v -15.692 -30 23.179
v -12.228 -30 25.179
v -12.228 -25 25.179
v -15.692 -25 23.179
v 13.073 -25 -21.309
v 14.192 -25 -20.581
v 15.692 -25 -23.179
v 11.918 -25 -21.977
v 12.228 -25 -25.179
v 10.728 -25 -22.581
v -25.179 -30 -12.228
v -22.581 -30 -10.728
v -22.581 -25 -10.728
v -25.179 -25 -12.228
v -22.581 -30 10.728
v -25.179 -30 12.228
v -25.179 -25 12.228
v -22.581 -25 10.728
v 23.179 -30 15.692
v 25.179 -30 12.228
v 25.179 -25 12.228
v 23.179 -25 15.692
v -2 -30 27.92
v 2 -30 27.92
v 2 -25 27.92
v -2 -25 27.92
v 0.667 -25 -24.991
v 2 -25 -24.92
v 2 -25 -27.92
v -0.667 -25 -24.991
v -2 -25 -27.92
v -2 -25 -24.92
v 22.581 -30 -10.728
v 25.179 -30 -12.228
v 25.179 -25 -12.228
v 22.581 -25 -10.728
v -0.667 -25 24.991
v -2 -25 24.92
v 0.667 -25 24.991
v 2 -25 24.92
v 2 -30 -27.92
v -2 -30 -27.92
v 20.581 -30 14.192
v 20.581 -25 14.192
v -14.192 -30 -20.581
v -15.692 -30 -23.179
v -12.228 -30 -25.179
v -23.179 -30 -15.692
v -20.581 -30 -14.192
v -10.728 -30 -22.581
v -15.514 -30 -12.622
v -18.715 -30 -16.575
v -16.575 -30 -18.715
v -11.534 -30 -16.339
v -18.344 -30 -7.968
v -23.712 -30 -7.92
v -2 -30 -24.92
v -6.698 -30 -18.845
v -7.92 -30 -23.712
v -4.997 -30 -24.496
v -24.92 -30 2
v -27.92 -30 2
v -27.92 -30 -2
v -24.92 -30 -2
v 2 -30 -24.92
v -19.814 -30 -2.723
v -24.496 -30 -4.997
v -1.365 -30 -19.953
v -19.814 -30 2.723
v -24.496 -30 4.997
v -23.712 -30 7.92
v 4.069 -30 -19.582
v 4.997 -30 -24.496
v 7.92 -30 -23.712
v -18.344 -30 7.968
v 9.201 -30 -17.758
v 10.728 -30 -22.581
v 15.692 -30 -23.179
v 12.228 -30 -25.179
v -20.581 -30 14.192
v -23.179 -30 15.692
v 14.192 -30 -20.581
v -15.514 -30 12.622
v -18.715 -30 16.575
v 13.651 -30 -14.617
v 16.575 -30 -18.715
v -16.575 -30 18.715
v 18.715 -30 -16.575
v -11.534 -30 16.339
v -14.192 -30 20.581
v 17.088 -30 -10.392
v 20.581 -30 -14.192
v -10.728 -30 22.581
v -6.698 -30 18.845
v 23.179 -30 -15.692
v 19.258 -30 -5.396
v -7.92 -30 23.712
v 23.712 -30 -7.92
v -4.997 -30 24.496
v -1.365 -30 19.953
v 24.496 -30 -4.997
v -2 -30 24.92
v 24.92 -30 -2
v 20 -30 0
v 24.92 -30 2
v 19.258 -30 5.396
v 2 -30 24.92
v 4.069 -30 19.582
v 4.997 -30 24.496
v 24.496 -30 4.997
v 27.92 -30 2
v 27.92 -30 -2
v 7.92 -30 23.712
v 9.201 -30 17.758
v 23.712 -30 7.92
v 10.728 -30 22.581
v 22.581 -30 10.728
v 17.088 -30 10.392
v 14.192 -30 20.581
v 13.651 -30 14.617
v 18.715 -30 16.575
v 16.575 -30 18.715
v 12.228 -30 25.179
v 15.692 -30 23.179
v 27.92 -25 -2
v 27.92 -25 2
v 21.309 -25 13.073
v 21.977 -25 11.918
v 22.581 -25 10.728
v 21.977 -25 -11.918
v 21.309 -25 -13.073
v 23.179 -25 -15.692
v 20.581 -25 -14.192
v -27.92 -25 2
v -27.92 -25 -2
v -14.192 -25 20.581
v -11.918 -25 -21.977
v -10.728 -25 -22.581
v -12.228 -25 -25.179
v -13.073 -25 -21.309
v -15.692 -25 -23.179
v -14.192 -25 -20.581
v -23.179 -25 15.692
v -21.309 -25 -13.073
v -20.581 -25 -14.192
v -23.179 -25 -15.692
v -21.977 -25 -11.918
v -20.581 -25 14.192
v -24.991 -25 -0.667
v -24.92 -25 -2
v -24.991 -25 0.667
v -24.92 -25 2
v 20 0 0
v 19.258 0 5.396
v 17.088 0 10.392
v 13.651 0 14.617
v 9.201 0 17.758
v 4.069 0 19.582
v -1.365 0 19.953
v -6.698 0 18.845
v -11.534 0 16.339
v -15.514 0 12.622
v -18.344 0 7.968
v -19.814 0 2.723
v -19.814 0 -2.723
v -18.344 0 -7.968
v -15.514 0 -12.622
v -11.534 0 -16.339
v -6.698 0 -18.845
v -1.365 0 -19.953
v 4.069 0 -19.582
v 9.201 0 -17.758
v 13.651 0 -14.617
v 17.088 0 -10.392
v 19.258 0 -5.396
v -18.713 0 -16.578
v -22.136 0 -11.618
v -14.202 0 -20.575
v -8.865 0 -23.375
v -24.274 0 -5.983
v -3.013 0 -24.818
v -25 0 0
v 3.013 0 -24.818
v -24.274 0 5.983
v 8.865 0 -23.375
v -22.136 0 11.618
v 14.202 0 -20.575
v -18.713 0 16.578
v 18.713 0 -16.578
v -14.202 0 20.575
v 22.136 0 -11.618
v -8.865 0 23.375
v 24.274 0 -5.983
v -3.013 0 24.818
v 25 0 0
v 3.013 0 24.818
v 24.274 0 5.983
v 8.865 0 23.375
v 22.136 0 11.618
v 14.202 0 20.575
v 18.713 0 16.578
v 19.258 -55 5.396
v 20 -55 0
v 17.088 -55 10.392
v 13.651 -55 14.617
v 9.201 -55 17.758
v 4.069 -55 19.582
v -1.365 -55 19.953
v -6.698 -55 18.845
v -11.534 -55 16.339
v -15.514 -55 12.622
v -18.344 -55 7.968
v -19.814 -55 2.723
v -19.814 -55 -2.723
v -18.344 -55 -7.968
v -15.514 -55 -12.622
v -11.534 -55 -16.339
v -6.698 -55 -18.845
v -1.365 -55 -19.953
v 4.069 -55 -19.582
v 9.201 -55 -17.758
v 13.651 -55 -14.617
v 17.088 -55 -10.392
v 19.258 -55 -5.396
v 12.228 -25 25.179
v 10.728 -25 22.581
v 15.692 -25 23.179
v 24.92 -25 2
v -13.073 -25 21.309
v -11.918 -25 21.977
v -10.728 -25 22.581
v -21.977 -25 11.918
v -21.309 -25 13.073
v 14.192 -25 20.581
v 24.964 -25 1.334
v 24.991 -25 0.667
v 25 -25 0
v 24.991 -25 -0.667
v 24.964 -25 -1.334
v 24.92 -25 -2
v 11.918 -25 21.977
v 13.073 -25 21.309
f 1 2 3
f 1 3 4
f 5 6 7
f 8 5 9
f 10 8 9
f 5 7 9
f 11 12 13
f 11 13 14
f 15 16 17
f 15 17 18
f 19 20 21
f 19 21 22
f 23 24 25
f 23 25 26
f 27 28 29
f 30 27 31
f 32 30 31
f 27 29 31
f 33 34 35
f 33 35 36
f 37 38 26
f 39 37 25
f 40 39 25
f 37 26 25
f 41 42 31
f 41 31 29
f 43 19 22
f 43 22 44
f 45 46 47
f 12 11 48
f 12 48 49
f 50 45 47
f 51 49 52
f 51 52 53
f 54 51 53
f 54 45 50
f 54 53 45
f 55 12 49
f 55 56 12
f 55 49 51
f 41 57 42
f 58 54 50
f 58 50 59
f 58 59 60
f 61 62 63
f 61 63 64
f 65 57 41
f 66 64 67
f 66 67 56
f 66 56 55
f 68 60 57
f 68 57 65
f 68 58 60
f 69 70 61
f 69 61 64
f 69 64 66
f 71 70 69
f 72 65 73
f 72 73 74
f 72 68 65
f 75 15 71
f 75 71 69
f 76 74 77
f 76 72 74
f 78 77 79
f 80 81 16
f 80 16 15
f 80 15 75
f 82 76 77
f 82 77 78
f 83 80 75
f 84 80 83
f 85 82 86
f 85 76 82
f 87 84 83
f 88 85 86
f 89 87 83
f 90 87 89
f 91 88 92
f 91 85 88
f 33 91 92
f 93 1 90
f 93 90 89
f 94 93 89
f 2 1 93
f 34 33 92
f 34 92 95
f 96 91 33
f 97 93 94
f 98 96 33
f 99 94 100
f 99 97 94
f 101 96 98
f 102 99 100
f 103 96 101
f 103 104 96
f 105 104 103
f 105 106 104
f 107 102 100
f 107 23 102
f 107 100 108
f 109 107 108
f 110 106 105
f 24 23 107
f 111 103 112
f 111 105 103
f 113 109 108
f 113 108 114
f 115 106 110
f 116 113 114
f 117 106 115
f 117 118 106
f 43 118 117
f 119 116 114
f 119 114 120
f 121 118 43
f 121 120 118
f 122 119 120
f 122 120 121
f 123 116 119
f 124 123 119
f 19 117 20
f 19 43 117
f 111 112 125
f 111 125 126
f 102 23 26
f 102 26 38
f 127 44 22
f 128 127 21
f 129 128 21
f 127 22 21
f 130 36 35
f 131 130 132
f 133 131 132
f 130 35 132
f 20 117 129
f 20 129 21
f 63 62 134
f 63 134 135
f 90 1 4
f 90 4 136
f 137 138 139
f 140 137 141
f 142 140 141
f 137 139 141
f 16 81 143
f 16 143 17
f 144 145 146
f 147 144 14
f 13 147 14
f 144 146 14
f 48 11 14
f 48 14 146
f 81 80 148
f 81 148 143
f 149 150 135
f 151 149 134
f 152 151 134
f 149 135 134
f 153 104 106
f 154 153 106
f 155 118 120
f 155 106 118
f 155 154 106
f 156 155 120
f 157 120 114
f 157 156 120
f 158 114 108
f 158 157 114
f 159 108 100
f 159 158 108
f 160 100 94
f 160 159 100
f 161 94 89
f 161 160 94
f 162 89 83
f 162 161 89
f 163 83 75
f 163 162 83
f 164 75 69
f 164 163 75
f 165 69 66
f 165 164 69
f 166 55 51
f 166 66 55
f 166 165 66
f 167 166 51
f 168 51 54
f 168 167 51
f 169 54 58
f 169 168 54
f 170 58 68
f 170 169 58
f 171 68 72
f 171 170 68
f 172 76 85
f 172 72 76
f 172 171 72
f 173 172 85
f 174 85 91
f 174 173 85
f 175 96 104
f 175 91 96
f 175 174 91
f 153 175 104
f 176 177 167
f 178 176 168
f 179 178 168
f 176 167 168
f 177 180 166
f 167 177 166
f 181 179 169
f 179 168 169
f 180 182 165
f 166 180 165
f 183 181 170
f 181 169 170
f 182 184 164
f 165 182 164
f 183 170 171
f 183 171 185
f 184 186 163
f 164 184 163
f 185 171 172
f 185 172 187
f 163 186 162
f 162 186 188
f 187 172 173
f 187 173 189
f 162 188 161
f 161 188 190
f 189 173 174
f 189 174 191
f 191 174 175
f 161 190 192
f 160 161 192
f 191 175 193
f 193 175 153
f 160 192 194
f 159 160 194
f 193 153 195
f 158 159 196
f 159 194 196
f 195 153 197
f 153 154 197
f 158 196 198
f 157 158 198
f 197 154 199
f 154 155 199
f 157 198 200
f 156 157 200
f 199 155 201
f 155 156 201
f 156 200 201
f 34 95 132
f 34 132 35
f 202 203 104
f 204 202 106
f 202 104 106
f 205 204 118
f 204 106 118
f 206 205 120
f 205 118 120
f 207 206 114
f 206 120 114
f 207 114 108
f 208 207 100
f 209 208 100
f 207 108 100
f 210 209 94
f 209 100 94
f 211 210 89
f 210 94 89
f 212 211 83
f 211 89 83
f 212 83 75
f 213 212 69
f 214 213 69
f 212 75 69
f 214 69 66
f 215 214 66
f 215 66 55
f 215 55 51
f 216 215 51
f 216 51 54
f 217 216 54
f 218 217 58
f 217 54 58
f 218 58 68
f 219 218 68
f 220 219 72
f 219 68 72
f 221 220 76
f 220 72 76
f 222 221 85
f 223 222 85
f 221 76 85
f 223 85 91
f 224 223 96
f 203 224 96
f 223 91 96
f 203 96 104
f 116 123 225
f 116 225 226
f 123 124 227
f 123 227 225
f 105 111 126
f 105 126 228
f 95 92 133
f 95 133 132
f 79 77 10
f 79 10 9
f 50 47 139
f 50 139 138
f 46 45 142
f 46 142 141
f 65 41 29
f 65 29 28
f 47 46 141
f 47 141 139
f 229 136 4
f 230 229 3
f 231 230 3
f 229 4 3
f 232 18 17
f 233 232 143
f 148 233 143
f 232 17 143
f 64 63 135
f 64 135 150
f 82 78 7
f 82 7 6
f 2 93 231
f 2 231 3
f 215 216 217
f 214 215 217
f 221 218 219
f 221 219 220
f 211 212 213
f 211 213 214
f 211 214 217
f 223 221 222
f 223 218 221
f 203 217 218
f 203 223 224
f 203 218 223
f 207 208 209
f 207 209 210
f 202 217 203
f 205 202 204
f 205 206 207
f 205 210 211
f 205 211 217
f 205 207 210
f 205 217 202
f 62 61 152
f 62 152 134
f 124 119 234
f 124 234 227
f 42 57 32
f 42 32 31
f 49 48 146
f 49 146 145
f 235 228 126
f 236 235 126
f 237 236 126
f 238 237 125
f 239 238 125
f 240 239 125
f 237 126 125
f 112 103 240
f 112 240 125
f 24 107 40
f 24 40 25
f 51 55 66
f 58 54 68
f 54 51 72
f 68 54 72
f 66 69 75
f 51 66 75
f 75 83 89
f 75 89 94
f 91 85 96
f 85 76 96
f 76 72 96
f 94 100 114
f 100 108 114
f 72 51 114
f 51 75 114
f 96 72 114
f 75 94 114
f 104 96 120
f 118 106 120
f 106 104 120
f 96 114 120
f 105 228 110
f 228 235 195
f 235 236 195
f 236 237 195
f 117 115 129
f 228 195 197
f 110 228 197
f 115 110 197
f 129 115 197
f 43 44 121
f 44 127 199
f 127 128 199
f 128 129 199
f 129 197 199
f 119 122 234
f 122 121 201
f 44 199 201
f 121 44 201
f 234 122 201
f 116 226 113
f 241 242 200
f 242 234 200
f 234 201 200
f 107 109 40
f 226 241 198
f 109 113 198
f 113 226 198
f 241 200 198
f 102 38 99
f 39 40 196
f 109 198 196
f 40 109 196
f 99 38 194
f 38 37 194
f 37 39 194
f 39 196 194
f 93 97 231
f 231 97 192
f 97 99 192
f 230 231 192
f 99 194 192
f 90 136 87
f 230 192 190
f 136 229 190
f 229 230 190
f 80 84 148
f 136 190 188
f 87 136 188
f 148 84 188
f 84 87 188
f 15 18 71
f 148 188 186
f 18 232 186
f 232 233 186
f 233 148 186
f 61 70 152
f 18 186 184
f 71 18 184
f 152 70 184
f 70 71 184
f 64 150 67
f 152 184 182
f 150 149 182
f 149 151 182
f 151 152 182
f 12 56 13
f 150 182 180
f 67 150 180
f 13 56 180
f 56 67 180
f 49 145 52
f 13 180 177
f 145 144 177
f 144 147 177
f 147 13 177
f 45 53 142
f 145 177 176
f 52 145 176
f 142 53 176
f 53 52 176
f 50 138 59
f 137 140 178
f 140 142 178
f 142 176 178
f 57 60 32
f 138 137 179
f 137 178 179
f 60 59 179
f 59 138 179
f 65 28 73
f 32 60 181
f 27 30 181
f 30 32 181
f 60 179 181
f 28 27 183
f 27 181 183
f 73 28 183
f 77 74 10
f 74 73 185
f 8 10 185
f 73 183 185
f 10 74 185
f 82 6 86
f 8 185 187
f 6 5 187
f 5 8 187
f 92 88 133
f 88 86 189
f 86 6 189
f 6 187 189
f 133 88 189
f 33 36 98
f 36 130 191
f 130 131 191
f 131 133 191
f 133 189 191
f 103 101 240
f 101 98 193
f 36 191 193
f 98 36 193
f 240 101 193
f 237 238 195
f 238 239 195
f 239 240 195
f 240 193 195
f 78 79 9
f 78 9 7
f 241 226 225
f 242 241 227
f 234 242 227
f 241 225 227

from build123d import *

# Parameters (mm, degrees)
F0_R     = 25
F0_R_2   = 20
F1_DEPTH = 30
F3_DEPTH = 5
F4_COUNT = 12
F5_R     = 20
F6_DEPTH = 25


with BuildPart() as f1:
    # F0 (on Front) → F1 (new body)
    with BuildSketch(Plane.XZ):
        Circle(F0_R)
        Circle(F0_R_2, mode=Mode.SUBTRACT)
    extrude(amount=F1_DEPTH)

    # F2 (on face) → F3 (join)
    with BuildSketch(Plane.XZ.offset(30)):
        with BuildLine():
            ThreePointArc((-2, 24.9198715888), (0, 25), (2, 24.9198715888))
            Line((2, 24.9198715888), (2, 27.9198715888))
            Line((2, 27.9198715888), (-2, 27.9198715888))
            Line((-2, 27.9198715888), (-2, 24.9198715888))
        make_face()
    extrude(amount=-F3_DEPTH)

    # F4: F1 ×12 about axis
    f4_axis = Axis((0, 0, 0), (0, 1, 0))


with BuildPart() as f1_1:
    add(f1.part)
    for i in range(1, F4_COUNT):
        add(f1.part.rotate(f4_axis, i * 360 / F4_COUNT))

    # F5 (on face) → F6 (join)
    with BuildSketch(Plane.XZ.offset(30)):
        Circle(F5_R)
    extrude(amount=F6_DEPTH)


solid = f1_1.part
